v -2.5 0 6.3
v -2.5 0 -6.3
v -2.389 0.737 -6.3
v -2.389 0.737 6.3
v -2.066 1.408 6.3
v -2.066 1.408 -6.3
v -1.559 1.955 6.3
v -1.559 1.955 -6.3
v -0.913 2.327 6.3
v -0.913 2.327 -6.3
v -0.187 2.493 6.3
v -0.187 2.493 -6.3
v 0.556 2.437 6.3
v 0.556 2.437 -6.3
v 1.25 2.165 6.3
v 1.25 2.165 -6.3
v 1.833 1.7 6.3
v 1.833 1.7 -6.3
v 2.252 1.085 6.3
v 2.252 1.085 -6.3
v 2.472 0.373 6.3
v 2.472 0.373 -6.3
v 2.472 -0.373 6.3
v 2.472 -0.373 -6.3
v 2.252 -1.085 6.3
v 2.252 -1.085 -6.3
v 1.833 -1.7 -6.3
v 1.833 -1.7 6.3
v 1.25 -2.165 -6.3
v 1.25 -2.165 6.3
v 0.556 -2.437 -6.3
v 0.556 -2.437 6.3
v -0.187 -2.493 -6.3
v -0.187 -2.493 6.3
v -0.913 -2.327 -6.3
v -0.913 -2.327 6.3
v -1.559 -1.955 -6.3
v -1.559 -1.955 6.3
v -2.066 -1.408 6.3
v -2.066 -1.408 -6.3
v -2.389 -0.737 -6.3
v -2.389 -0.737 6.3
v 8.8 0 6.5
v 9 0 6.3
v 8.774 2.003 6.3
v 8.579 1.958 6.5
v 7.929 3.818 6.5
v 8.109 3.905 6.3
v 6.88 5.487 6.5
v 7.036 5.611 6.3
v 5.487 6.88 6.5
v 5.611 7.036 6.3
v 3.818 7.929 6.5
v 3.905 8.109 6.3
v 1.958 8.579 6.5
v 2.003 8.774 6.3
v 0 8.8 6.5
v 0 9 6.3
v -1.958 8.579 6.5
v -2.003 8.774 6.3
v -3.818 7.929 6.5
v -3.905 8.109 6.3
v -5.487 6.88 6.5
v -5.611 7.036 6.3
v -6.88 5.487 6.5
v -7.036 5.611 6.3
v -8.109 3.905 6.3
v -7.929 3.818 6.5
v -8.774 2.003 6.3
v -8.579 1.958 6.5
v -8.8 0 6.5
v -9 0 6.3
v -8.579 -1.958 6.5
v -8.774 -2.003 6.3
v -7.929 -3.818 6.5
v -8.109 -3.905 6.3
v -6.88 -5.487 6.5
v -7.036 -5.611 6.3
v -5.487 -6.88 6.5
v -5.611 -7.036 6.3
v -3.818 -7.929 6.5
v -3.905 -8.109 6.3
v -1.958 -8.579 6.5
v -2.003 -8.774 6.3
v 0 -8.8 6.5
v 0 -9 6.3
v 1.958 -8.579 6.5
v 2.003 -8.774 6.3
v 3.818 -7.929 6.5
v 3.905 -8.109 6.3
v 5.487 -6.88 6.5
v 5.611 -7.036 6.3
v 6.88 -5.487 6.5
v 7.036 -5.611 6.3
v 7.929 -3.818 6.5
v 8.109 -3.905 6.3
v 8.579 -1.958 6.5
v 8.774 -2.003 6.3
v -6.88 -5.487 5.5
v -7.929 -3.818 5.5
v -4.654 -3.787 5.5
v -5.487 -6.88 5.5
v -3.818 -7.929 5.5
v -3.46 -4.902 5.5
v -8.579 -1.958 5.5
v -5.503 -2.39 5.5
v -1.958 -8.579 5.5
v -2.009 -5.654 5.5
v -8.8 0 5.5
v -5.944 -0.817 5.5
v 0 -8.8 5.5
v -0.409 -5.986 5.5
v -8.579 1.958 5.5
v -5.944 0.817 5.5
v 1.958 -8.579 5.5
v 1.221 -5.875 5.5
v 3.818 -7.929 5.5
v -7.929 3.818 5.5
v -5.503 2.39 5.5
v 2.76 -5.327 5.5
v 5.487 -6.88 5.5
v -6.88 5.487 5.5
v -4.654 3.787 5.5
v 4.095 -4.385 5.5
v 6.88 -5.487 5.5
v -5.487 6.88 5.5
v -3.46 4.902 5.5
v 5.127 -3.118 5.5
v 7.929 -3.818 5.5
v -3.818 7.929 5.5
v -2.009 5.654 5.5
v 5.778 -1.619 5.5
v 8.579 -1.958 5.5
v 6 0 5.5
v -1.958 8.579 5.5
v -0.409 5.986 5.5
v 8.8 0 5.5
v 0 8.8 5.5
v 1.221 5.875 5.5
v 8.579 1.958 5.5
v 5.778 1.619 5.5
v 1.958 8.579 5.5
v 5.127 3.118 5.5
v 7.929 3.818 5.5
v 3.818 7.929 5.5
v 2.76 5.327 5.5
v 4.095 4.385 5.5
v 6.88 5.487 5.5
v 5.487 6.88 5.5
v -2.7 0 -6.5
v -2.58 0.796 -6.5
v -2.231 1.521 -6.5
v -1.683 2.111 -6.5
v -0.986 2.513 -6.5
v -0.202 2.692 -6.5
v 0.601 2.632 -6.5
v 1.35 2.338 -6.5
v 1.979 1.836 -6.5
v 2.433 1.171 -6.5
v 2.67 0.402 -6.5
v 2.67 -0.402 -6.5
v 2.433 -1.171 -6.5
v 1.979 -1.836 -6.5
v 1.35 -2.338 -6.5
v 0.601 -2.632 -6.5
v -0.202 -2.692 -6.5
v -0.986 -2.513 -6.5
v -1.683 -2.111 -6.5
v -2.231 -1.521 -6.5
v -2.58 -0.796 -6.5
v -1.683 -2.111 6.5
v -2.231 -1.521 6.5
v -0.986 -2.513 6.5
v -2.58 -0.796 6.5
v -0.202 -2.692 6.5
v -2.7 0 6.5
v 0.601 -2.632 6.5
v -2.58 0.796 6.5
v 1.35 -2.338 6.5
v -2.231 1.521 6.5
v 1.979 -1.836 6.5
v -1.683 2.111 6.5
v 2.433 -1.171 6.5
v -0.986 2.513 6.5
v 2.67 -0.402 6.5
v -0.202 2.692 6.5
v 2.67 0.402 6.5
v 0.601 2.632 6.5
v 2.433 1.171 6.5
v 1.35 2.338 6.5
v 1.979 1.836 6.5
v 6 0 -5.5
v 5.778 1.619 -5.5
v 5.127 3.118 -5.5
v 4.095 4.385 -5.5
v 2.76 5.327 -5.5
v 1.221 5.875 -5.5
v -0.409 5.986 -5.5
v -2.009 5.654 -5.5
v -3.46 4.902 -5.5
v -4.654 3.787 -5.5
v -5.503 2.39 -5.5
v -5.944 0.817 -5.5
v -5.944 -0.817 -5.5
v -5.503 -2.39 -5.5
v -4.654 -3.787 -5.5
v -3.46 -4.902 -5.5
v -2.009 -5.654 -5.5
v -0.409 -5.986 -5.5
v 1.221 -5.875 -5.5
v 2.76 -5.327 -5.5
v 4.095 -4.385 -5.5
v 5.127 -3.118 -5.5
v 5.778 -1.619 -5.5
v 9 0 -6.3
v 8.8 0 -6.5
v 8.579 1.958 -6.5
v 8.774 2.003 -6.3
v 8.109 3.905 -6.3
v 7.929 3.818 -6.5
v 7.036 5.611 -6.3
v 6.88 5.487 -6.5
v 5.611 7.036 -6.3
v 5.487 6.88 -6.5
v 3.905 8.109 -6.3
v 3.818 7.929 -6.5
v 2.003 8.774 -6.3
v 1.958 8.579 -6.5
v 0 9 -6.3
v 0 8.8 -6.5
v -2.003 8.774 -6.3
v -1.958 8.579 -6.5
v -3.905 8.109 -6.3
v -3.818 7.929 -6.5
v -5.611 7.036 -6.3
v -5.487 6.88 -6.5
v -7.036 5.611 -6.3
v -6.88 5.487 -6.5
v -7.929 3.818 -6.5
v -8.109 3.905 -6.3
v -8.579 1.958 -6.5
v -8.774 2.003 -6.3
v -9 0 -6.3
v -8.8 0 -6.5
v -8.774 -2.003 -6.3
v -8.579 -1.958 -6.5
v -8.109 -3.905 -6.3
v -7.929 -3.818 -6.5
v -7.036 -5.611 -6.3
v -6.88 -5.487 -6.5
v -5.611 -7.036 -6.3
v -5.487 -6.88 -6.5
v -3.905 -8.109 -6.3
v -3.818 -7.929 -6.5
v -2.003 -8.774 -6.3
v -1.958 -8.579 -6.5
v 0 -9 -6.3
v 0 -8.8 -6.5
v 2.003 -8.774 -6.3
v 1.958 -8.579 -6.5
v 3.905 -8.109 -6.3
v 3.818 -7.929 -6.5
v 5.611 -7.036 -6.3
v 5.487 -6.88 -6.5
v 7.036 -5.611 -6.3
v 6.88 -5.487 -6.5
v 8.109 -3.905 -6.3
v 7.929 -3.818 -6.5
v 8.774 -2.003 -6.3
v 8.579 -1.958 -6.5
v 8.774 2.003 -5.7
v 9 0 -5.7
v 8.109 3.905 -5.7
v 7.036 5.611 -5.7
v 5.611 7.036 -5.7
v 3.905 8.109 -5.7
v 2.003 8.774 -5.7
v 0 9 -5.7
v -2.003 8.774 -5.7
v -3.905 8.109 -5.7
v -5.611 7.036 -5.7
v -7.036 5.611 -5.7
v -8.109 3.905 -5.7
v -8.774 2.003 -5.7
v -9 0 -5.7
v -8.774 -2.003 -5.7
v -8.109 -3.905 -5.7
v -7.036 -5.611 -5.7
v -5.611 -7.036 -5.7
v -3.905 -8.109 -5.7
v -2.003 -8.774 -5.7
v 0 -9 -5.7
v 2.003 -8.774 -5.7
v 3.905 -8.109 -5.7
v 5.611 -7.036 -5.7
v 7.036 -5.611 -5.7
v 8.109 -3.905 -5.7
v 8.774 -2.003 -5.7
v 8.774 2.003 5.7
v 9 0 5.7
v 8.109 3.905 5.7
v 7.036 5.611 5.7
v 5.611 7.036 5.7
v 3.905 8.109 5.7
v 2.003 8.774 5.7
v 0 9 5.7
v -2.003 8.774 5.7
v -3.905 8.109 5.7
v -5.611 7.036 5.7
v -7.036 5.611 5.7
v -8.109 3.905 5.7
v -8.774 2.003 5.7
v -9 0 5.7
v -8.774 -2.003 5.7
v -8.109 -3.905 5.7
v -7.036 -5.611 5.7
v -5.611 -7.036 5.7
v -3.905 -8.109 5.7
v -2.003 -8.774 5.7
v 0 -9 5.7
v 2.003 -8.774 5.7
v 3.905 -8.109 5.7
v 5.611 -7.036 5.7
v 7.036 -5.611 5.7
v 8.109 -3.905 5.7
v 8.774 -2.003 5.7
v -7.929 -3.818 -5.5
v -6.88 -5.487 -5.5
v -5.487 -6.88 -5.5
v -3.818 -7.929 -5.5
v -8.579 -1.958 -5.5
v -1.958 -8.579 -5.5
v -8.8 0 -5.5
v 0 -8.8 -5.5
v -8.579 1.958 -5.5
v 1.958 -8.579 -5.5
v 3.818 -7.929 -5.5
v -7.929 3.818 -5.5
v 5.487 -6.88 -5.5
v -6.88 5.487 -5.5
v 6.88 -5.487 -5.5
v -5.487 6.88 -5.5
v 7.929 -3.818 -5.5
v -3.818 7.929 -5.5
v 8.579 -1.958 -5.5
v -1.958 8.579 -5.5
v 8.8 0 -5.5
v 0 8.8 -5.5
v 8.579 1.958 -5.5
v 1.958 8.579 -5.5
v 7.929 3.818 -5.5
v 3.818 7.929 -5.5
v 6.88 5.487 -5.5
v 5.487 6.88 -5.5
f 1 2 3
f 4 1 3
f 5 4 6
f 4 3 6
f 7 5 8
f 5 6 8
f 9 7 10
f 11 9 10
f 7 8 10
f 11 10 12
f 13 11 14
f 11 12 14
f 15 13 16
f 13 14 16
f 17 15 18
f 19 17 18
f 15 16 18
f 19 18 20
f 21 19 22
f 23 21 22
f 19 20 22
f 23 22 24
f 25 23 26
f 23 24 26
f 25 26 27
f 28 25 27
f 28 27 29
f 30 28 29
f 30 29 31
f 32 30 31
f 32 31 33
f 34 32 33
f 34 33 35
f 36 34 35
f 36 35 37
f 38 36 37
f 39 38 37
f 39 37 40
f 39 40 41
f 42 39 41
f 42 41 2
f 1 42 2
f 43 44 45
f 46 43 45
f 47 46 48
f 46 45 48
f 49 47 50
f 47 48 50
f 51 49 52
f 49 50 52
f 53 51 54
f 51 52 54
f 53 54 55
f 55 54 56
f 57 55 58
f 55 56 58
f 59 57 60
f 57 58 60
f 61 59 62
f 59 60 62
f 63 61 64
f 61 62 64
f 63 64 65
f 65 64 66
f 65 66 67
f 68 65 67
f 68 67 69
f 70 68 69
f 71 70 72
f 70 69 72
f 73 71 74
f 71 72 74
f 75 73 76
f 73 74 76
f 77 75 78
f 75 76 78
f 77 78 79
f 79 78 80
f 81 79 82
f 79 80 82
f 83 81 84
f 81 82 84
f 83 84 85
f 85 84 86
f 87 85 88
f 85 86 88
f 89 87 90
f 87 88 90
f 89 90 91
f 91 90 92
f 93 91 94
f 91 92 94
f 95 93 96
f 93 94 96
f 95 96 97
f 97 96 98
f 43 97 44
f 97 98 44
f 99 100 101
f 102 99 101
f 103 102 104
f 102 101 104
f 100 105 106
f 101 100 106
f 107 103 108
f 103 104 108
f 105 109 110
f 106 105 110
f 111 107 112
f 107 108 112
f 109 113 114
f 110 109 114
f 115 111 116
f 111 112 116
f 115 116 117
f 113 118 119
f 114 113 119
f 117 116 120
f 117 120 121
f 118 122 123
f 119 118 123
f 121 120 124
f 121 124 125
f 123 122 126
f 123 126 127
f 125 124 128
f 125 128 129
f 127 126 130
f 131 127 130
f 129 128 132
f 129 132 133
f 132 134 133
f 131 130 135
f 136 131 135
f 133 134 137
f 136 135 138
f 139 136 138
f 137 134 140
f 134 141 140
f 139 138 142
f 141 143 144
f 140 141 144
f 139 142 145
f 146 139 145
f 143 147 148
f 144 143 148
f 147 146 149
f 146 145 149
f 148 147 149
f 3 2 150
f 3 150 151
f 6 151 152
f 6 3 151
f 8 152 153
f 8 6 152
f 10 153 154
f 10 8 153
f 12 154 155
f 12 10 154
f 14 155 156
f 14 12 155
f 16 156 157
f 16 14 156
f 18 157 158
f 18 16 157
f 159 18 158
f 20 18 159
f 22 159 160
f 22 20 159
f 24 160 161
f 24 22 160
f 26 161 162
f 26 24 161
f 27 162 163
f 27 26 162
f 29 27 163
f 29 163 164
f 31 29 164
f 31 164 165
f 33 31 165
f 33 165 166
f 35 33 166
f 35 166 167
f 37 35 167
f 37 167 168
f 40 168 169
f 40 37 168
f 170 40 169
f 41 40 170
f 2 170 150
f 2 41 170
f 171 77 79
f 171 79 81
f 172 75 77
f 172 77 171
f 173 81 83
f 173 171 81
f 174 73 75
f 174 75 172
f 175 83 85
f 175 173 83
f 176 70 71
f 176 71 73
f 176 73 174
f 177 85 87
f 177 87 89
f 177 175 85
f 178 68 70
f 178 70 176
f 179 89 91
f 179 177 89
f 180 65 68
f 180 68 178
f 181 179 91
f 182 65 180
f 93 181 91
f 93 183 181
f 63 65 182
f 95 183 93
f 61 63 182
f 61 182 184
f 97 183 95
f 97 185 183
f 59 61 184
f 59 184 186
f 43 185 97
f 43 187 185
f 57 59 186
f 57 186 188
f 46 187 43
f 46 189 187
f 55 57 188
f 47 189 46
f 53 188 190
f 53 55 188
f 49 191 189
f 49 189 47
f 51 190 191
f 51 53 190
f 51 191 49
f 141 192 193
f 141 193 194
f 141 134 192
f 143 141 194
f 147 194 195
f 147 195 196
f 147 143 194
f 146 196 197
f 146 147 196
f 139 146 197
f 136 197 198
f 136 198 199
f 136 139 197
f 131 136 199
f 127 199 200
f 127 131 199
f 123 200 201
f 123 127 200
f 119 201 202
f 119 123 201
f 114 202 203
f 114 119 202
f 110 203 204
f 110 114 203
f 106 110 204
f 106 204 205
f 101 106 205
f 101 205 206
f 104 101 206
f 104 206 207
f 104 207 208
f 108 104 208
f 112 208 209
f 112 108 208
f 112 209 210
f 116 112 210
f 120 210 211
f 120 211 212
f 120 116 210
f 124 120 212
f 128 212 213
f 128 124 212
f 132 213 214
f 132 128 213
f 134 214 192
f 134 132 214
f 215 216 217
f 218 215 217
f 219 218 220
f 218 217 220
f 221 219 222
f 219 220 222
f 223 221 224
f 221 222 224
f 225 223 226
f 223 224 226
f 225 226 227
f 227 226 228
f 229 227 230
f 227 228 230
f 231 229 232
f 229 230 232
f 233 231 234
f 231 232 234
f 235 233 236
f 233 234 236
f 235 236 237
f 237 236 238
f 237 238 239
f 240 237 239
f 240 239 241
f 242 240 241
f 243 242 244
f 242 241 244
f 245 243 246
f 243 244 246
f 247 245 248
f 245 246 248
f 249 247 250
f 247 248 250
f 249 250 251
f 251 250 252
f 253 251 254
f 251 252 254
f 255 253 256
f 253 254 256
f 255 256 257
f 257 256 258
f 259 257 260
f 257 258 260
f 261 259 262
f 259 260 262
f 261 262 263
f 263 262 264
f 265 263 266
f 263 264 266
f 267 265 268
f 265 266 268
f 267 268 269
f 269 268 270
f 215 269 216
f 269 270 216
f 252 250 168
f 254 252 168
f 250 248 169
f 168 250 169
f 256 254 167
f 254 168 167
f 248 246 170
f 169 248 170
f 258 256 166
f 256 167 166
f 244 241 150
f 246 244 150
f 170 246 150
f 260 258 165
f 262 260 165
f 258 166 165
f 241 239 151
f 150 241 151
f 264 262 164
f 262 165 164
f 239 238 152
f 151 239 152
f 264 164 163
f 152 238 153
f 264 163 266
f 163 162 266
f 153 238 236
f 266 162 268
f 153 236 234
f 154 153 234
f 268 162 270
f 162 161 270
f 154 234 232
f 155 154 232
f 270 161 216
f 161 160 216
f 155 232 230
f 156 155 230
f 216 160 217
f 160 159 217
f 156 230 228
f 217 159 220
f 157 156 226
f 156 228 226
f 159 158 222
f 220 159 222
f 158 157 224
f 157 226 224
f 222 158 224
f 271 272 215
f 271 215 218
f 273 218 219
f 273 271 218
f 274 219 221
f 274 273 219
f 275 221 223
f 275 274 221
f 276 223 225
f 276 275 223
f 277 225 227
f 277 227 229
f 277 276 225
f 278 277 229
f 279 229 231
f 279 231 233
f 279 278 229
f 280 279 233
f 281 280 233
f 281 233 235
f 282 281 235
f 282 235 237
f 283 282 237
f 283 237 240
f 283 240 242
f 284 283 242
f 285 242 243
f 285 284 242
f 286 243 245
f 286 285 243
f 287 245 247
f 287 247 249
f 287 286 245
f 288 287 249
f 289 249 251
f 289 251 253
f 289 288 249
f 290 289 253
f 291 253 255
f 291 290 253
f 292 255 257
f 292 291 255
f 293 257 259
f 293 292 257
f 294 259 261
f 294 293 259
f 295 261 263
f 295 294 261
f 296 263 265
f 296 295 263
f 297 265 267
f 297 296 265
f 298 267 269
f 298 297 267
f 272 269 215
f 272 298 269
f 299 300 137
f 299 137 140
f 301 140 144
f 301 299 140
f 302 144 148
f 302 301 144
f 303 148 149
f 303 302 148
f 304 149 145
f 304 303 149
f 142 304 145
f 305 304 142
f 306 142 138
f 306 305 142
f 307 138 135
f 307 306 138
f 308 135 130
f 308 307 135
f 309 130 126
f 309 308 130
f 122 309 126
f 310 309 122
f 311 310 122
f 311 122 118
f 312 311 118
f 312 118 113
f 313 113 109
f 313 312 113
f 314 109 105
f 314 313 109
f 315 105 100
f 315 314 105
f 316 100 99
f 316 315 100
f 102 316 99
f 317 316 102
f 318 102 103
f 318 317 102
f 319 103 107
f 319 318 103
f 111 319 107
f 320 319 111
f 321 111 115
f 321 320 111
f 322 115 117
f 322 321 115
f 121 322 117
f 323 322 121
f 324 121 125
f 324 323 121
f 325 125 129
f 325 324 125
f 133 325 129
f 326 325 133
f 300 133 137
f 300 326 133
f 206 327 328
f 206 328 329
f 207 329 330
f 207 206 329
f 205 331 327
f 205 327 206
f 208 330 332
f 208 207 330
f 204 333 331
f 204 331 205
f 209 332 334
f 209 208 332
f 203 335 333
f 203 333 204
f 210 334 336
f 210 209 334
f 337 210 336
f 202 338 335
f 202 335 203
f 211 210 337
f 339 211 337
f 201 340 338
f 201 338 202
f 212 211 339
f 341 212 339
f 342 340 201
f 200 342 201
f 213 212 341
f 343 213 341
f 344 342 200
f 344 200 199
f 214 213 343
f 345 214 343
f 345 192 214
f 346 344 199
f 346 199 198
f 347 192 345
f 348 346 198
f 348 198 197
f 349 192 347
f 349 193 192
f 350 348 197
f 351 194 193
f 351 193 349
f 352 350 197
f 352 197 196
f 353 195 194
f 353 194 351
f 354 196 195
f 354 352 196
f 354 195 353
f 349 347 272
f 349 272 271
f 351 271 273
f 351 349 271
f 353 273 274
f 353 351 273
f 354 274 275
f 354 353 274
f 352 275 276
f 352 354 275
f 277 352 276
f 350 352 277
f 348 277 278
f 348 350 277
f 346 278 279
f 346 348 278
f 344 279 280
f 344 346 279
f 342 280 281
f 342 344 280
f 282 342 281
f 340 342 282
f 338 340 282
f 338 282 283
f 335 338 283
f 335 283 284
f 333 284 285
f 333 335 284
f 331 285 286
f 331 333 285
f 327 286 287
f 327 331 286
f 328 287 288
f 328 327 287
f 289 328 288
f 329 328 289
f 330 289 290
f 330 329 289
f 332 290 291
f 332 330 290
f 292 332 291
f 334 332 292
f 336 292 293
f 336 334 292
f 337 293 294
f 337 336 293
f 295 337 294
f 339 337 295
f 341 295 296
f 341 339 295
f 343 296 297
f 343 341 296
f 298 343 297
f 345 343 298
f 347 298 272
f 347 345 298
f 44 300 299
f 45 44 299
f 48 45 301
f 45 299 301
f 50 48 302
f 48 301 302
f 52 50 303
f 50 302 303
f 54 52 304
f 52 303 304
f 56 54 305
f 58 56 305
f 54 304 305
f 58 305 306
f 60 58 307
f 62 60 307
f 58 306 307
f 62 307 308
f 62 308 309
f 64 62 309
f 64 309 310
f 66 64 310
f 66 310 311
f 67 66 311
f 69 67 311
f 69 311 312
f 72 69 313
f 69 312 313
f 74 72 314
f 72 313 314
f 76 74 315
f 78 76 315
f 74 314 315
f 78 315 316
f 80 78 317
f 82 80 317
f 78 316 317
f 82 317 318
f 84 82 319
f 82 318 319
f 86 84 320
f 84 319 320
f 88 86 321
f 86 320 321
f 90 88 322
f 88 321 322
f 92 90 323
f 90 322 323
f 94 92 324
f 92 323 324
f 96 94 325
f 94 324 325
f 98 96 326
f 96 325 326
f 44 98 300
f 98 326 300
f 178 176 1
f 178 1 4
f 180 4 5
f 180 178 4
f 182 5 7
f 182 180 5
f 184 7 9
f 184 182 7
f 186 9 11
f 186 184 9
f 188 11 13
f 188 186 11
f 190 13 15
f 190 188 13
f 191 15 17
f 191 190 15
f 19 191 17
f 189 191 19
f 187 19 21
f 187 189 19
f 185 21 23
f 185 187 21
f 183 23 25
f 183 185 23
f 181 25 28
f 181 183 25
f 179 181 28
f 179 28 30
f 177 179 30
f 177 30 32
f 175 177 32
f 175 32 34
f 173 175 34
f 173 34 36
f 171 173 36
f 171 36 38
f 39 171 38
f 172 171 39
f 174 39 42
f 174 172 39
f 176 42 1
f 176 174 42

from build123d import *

# Parameters (mm, degrees)
SKIZZE1_R                       = 6
AUFSATZ_LINEAR_AUSTRAGEN1_DEPTH = 5.5
SKIZZE2_R                       = 9
AUFSATZ_LINEAR_AUSTRAGEN2_DEPTH = 1
SKIZZE3_R                       = 2.5
SCHNITT_LINEAR_AUSTRAGEN1_DEPTH = 19.193405399
FASE1_SIZE                      = 0.2


with BuildPart() as part:
    # Skizze1 → Aufsatz-Linear austragen1 (new, symmetric)
    with BuildSketch(Plane.XY):
        Circle(SKIZZE1_R)
    extrude(amount=AUFSATZ_LINEAR_AUSTRAGEN1_DEPTH, both=True)

    # Skizze2 → Aufsatz-Linear austragen2 (add)
    with BuildSketch(Plane.XY.offset(5.5)):
        Circle(SKIZZE2_R)
    aufsatz_linear_austragen2 = extrude(amount=AUFSATZ_LINEAR_AUSTRAGEN2_DEPTH)

    # Spiegeln1: Aufsatz-Linear austragen2 across plane
    add(aufsatz_linear_austragen2.mirror(Plane.XY))

    # Skizze3 → Schnitt-Linear austragen1 (cut, through all)
    with BuildSketch(Plane(origin=(0, 0, -6.5), x_dir=(-1, 0, 0), z_dir=(0, 0, -1))):
        Circle(SKIZZE3_R)
    extrude(amount=-SCHNITT_LINEAR_AUSTRAGEN1_DEPTH, mode=Mode.SUBTRACT)

    # Fase1
    fase1_edges = [part.edges().sort_by_distance(p)[0] for p in [
        (-9, 0, -5.5),
        (2.5, 0, 6.5),
        (2.5, 0, -6.5),
        (-9, 0, 5.5),
        (-9, 0, 6.5),
        (-9, 0, -6.5),
    ]]
    chamfer(fase1_edges, length=FASE1_SIZE)


solid = part.part
